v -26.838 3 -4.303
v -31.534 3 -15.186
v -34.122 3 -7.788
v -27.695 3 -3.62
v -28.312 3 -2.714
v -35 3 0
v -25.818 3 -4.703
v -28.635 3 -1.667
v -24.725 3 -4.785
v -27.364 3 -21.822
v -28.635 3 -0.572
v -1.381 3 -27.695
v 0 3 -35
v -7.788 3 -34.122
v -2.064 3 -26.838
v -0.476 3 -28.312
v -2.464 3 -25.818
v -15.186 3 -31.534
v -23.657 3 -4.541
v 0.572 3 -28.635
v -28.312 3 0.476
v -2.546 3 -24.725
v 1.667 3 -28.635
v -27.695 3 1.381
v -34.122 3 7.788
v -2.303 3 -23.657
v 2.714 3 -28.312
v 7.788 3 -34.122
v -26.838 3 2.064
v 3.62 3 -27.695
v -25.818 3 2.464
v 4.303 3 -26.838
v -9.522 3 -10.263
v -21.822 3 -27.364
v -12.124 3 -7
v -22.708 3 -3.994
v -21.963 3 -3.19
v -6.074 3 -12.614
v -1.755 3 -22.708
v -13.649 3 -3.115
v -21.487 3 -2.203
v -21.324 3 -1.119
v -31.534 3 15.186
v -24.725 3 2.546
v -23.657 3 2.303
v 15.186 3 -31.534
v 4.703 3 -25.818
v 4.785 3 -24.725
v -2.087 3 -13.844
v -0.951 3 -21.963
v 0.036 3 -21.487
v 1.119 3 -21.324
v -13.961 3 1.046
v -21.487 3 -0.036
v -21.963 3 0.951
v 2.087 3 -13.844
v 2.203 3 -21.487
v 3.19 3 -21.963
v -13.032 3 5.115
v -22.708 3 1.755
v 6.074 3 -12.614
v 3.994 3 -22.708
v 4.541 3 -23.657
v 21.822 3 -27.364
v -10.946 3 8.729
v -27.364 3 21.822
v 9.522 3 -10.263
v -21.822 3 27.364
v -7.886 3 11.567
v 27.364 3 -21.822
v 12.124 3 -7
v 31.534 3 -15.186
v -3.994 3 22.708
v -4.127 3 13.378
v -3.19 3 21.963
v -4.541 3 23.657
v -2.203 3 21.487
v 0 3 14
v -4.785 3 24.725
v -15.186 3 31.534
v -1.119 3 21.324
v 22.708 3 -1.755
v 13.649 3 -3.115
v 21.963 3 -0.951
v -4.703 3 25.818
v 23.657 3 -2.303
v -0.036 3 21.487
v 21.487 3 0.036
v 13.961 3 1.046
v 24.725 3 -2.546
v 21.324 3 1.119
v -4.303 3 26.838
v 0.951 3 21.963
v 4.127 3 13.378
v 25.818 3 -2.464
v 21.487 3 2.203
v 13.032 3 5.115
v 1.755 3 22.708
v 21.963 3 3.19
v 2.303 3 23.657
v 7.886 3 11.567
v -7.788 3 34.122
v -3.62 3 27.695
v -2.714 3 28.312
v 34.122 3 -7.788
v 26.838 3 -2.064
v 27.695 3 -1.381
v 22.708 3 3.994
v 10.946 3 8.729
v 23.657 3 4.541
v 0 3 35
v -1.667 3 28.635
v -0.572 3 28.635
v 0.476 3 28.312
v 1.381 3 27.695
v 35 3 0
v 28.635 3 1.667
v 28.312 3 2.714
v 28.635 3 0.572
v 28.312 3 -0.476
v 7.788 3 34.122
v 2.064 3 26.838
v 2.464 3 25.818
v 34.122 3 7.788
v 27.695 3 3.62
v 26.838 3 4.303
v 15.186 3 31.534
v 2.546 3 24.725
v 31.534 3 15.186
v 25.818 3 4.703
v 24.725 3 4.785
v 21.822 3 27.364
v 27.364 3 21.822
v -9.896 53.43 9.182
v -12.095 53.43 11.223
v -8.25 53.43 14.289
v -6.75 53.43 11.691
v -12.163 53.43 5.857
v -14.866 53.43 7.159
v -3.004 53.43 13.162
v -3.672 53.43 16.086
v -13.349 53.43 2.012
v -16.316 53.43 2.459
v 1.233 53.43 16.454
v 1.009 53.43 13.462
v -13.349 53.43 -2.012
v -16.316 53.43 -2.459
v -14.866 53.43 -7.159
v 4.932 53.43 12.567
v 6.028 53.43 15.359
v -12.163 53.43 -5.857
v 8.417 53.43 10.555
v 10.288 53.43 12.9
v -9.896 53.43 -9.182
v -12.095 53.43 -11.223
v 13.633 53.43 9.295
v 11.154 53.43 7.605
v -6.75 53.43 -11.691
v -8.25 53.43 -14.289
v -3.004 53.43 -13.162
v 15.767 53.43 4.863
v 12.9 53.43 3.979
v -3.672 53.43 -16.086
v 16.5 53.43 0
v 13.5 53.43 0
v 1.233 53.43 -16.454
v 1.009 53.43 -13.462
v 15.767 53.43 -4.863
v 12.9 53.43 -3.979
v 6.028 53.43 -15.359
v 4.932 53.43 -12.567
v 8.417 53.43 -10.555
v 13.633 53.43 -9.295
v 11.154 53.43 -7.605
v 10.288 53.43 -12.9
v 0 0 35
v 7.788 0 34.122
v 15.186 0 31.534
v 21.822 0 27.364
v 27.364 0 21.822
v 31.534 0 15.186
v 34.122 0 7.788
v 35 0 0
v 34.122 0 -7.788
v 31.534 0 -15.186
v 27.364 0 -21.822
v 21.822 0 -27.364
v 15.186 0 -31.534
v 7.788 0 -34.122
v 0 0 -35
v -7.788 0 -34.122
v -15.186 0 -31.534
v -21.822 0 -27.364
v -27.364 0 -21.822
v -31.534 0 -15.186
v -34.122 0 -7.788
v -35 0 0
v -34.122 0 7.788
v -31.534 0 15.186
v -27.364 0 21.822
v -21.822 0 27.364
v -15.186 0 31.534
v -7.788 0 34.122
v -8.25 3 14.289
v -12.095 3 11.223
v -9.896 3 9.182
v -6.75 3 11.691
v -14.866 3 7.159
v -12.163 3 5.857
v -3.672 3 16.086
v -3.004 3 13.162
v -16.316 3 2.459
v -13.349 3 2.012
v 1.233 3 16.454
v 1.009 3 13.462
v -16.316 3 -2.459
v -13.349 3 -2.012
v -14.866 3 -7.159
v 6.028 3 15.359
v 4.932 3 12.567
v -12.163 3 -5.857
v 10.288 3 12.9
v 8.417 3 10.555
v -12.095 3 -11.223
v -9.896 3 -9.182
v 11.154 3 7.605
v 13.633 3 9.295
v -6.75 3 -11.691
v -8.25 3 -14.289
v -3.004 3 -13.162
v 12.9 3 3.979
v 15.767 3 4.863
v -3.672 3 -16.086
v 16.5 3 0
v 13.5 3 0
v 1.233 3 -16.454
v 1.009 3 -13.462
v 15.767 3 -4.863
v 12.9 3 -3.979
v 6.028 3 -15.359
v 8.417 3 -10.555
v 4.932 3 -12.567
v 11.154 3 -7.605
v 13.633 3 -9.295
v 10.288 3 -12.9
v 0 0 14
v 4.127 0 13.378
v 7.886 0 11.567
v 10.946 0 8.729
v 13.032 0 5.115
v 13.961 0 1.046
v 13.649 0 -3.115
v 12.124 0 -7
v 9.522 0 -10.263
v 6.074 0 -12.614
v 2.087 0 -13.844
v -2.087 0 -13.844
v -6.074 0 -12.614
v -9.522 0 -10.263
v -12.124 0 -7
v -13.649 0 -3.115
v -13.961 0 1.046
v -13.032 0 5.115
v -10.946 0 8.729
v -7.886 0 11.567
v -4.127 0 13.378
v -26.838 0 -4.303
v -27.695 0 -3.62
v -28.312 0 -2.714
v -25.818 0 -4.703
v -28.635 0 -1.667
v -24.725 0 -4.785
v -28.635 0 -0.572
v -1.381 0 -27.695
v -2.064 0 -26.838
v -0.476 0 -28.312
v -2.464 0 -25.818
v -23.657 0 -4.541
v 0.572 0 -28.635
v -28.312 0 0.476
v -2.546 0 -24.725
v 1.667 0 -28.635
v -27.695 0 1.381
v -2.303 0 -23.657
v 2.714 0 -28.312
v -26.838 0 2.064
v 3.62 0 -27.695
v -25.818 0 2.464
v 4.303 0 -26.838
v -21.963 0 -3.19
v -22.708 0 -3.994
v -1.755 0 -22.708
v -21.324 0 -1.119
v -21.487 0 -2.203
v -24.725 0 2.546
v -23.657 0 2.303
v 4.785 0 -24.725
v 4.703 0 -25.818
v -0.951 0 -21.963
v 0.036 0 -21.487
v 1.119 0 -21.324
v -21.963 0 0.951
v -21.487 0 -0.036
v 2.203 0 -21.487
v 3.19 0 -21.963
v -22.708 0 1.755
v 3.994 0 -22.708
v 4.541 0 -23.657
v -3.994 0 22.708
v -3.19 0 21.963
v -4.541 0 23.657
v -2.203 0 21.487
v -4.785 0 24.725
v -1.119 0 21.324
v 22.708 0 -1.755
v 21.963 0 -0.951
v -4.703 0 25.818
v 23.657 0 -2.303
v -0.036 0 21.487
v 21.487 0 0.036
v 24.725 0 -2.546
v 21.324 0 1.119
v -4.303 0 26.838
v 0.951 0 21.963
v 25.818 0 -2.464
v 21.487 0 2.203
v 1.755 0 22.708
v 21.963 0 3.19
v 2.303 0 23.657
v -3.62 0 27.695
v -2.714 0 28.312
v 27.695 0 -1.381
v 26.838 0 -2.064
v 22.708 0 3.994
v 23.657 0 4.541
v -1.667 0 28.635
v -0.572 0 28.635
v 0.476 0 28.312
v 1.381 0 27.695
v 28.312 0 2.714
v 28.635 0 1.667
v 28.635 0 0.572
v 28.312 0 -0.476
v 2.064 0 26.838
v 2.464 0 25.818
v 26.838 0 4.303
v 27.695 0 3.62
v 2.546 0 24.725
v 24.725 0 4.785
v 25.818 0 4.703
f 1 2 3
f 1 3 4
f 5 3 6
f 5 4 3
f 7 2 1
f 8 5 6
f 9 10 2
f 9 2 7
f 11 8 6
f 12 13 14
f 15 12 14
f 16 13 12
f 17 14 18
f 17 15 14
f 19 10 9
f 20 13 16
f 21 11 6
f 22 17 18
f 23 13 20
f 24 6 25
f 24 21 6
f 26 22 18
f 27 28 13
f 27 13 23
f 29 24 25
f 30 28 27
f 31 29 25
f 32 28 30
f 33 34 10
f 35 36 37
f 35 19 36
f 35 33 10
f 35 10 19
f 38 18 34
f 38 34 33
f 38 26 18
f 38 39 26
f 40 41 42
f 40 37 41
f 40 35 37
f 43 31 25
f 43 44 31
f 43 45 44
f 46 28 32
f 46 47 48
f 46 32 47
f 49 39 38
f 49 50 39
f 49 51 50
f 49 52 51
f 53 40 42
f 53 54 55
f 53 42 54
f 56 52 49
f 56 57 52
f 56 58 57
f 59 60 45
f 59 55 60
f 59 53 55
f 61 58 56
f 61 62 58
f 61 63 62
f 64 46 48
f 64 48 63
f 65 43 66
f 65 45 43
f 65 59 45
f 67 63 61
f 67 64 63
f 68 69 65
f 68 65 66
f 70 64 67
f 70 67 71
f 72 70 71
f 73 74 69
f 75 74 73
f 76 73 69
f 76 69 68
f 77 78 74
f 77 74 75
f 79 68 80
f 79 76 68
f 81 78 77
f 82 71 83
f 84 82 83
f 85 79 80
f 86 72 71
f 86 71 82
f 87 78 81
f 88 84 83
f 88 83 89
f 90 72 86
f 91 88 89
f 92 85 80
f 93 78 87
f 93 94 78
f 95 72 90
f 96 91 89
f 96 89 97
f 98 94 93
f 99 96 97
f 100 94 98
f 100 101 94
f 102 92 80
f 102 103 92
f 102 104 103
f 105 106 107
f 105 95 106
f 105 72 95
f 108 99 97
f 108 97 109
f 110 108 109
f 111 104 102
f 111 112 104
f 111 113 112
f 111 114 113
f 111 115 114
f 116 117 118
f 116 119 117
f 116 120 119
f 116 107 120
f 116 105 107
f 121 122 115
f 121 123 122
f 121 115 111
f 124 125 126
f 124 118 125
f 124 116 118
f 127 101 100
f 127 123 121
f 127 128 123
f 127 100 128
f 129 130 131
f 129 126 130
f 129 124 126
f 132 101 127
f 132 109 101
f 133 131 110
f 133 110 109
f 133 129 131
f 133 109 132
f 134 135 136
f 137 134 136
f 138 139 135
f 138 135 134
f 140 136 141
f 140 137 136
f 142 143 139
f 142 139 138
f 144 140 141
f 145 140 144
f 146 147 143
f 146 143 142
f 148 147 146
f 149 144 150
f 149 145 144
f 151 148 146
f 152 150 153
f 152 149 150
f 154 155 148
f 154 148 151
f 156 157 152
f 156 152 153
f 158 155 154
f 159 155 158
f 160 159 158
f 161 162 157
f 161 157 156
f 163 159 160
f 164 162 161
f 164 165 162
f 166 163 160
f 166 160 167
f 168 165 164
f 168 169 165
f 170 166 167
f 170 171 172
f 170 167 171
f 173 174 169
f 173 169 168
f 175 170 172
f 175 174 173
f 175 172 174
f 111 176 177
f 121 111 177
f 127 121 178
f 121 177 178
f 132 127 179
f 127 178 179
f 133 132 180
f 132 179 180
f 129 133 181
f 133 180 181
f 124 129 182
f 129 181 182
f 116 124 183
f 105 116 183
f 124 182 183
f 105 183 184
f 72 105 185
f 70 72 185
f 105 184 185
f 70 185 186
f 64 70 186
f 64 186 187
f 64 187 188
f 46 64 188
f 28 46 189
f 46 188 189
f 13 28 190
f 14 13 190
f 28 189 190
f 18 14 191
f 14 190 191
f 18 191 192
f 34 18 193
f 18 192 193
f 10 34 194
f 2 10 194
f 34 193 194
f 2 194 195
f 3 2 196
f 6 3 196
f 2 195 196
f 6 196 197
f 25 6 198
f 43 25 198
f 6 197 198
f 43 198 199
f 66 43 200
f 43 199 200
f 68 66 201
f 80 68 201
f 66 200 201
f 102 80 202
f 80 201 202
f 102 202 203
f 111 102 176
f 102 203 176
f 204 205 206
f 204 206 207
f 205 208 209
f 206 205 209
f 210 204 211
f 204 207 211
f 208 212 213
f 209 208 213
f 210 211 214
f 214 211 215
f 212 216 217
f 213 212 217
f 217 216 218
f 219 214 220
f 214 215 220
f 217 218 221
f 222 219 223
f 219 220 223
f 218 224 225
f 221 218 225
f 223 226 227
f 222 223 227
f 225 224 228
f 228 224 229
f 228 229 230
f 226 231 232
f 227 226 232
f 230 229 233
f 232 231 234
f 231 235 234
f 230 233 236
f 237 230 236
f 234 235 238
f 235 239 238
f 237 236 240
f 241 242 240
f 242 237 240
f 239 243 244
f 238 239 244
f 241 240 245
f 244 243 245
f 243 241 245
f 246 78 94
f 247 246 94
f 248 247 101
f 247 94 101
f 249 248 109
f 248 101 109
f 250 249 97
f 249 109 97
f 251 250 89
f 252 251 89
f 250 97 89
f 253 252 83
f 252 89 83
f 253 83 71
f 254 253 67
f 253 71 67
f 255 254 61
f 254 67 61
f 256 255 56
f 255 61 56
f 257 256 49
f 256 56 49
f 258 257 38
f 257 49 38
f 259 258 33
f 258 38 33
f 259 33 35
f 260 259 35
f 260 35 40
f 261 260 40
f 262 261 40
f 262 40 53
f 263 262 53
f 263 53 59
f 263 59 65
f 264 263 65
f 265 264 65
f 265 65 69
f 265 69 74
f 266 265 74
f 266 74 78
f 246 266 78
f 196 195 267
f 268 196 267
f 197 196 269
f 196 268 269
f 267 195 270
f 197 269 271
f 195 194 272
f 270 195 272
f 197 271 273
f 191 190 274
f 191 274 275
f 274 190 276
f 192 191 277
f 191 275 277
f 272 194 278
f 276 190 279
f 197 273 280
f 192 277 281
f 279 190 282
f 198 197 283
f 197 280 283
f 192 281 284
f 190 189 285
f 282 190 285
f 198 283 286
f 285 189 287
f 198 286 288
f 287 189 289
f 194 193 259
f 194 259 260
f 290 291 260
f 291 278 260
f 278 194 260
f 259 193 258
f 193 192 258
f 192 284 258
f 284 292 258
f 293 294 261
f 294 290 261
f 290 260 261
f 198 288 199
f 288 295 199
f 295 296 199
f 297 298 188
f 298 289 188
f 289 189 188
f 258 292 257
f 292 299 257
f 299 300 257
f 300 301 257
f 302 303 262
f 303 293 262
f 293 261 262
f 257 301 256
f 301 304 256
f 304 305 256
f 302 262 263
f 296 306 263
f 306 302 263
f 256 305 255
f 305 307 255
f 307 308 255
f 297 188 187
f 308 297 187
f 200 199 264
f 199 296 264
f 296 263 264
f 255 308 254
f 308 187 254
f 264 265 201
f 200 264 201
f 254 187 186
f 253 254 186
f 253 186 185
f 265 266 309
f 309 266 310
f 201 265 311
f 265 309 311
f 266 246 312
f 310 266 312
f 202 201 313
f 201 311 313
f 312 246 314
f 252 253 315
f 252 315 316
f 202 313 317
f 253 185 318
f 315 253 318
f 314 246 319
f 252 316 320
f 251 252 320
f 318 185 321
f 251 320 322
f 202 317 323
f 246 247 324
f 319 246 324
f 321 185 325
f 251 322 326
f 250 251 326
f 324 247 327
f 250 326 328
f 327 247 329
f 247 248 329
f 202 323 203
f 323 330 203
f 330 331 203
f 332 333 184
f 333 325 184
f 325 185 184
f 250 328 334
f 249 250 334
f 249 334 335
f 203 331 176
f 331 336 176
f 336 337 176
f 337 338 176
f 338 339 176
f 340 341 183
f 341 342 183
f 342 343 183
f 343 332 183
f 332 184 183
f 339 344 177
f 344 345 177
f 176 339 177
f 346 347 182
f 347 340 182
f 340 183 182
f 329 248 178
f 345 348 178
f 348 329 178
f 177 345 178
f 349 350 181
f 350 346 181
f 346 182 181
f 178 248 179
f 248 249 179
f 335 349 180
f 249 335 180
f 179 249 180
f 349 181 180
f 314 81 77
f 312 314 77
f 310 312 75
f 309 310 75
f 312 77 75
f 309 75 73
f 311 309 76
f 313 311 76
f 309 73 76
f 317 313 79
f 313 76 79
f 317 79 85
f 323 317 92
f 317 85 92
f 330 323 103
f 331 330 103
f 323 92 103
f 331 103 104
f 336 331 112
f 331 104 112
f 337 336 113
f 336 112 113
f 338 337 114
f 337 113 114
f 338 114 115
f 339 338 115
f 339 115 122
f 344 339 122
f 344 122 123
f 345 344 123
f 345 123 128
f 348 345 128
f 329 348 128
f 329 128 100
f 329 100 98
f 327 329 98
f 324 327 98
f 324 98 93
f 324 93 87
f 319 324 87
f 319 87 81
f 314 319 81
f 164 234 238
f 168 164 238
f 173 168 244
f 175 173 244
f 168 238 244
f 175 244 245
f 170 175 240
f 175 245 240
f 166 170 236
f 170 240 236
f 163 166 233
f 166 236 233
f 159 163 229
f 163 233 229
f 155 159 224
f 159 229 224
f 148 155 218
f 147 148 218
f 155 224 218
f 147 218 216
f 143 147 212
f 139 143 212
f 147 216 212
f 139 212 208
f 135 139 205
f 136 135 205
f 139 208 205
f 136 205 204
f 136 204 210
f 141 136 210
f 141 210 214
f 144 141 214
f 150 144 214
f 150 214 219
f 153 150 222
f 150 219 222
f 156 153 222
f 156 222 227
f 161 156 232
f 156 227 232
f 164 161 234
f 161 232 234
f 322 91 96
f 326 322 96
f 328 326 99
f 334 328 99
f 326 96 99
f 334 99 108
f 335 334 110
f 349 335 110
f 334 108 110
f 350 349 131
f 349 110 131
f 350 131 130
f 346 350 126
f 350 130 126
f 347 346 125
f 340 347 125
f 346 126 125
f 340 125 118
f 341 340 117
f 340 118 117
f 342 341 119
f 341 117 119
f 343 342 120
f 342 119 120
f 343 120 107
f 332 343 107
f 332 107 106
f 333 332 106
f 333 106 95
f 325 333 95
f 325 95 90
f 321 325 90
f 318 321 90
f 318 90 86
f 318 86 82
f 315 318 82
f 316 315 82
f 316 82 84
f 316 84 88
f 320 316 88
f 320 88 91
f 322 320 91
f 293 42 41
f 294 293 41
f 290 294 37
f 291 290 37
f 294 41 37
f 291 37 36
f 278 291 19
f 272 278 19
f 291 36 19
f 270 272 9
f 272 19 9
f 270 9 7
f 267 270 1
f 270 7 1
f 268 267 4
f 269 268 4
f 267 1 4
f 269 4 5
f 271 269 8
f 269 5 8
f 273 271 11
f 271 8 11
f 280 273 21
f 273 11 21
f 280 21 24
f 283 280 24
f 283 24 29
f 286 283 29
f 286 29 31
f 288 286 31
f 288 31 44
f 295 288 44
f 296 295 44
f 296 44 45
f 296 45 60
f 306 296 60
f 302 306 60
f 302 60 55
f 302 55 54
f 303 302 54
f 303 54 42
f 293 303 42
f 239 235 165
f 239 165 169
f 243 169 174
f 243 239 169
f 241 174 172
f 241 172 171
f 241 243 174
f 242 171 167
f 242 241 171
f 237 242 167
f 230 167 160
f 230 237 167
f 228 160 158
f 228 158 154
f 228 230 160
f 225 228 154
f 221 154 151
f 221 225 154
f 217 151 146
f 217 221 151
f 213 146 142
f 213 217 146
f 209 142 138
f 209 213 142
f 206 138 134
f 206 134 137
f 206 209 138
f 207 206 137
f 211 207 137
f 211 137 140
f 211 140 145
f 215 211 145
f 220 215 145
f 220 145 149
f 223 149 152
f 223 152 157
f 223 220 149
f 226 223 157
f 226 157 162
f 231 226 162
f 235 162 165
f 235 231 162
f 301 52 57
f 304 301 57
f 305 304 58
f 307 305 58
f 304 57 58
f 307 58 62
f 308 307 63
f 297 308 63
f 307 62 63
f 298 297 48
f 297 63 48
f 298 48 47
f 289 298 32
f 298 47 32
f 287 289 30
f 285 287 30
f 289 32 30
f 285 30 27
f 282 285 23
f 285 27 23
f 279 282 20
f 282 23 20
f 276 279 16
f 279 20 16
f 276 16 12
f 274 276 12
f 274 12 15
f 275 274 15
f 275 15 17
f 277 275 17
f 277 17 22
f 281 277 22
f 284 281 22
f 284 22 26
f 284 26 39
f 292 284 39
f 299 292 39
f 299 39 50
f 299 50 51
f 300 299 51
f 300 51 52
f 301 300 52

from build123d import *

# Parameters (mm, degrees)
SKETCH1_R           = 35
BOSS_EXTRUDE1_DEPTH = 3
SKETCH2_R           = 14
CUT_EXTRUDE1_DEPTH  = 6
SKETCH3_R           = 3.676124065
CUT_EXTRUDE2_DEPTH  = 6
CIRPATTERN1_COUNT   = 4
SKETCH4_R           = 16.5
SKETCH4_R_2         = 13.5
EXTRUDE_THIN1_DEPTH = 50.43


with BuildPart() as part:
    # Sketch1 → Boss-Extrude1 (new body)
    with BuildSketch(Plane(origin=(0, 0, 0), x_dir=(1, 0, 0), z_dir=(0, 1, 0))):
        with Locations(Location((0, 0, 0), (0, 0, 270))):
            Circle(SKETCH1_R)
    extrude(amount=BOSS_EXTRUDE1_DEPTH)

    # Sketch2 → Cut-Extrude1 (cut)
    with BuildSketch(Plane(origin=(0, 3, 0), x_dir=(1, 0, 0), z_dir=(0, 1, 0))):
        with Locations(Location((0, 0, 0), (0, 0, 270))):
            Circle(SKETCH2_R)
    extrude(amount=-CUT_EXTRUDE1_DEPTH, mode=Mode.SUBTRACT)

    # Sketch3 → Cut-Extrude2 (cut)
    with BuildSketch(Plane(origin=(0, 3, 0), x_dir=(1, 0, 0), z_dir=(0, 1, 0))):
        with Locations(Location((1.119457284, 25, 0), (0, 0, 270))):
            Circle(SKETCH3_R)
    cut_extrude2 = extrude(amount=-CUT_EXTRUDE2_DEPTH, mode=Mode.SUBTRACT)

    # CirPattern1: Cut-Extrude2 ×4 about axis
    cirpattern1_axis = Axis((0, 0, 0), (0, 1, 0))
    for i in range(1, CIRPATTERN1_COUNT):
        add(cut_extrude2.rotate(cirpattern1_axis, i * 360 / CIRPATTERN1_COUNT), mode=Mode.SUBTRACT)


with BuildPart() as body_2:
    # Sketch4 → Extrude-Thin1 (new body)
    with BuildSketch(Plane(origin=(0, 3, 0), x_dir=(1, 0, 0), z_dir=(0, 1, 0))):
        Circle(SKETCH4_R)
        Circle(SKETCH4_R_2, mode=Mode.SUBTRACT)
    extrude(amount=EXTRUDE_THIN1_DEPTH)


solid = Compound([part.part, body_2.part])
